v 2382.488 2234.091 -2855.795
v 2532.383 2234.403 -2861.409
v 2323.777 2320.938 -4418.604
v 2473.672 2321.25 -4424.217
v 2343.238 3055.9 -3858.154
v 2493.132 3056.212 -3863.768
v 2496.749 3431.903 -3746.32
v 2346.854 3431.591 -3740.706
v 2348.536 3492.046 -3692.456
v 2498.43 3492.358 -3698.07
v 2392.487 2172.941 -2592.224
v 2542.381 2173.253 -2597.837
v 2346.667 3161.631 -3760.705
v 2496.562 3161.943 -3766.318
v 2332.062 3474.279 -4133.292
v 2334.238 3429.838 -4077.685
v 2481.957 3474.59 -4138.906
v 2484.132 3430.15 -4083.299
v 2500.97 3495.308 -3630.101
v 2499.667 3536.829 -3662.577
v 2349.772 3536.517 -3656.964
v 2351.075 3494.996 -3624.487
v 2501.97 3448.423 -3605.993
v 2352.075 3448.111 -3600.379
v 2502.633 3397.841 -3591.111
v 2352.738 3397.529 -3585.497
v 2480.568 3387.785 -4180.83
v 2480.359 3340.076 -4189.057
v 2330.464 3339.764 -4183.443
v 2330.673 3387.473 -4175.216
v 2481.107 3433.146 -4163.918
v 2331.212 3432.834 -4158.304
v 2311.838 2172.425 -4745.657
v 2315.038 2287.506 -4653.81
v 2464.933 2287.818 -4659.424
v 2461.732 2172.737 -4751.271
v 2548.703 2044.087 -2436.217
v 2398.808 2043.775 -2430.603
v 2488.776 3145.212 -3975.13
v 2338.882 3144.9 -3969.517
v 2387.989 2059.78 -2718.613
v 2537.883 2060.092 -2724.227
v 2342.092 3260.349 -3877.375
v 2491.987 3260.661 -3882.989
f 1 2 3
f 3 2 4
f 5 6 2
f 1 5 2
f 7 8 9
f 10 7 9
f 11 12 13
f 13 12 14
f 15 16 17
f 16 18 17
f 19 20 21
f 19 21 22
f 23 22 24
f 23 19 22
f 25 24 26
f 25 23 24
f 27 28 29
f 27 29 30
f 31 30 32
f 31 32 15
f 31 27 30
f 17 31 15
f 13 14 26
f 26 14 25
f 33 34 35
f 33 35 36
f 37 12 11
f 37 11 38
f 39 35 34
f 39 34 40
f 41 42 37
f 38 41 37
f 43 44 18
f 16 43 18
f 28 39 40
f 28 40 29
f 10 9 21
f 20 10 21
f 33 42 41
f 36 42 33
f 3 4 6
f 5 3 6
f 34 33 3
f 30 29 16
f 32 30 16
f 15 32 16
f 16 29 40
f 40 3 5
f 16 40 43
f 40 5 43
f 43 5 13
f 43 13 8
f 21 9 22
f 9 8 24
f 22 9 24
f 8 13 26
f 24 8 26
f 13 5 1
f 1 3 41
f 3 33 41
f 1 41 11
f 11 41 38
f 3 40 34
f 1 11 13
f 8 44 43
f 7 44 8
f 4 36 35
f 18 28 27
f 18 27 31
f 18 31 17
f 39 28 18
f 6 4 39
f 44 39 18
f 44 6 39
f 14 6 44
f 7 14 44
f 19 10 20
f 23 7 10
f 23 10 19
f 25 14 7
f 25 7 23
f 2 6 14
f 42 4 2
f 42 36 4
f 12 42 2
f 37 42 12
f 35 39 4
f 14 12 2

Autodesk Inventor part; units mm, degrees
sketch "Sketch1" plane through (0, 0, 0) normal (0, 0, 1) x (1, 0, 0)
  arc A0 (4796.3585, -1909.6289) -> (3343.4744, 1121.5056) centre (-3903.1767, -4215.7265) ccw
  line L0 (3236.8192, 1046.7661) -> (3343.5051, 1121.464)
  arc A1 (3228.7635, 1285.3391) -> (1546.1726, 3076.3751) centre (-4110.5601, -3923.7232) ccw
  line L1 (3228.7635, 1285.3391) -> (3122.0787, 1210.6419)
  line L2 (1372.9503, 3176.3452) -> (1308.1705, 3064.1503)
  arc A2 (1372.9503, 3176.3452) -> (93.8576, 4024.2684) centre (-4221.2651, -3873.8147) ccw
  line L3 (1481.3729, 2964.1457) -> (1546.1726, 3076.3751)
  arc A3 (4543.4821, -2147.4888) -> (93.8528, 3844.2289) centre (-4256.4671, -4034.5221) ccw
  line L4 (93.8576, 4024.2684) -> (93.8528, 3844.2289)
  line L5 (1308.1705, 3064.1503) -> (1481.3729, 2964.1457)
  line L6 (3122.0787, 1210.6419) -> (3236.8192, 1046.7661)
  arc A4 (4543.4821, -2147.4888) -> (4796.3585, -1909.6289) centre (4134.8595, -1459.7188) ccw
  point P0 (0, 0)
  dimension "d7" = 800
ref_plane "Work Plane2" through (0, 0, -8101) normal (0, 0, 1) x (1, 0, 0)
ref_plane "Work Plane1" through (0, 0, 0) normal (0, 0, 1) x (1, 0, 0)
sketch "Sketch2" plane through (0, 0, -8101) normal (0, 0, 1) x (1, 0, 0)
  arc A0 (1192.0552, 3508.338) -> (93.8528, 4294.485) centre (-5164.5547, -4211.3454) ccw projected
  arc A1 (3133.8513, 1483.0798) -> (1365.2603, 3408.338) centre (-5051.6105, -4261.3276) ccw projected
  arc A2 (4543.6426, -2147.8414) -> (93.8528, 4114.0508) centre (-5207.4444, -4365.1147) ccw projected
  line L0 (1192.0552, 3508.338) -> (1126.9741, 3395.6142) projected
  line L1 (1365.2603, 3408.338) -> (1300.1792, 3295.6142) projected
  line L2 (1126.9741, 3395.6142) -> (1300.1792, 3295.6142) projected
  line L3 (93.8528, 4294.485) -> (93.8528, 4114.0508) projected
  line L4 (3027.6129, 1408.6909) -> (3133.8513, 1483.0798) projected
  line L5 (3142.3282, 1244.8605) -> (3248.5665, 1319.2494) projected
  line L6 (3027.6129, 1408.6909) -> (3142.3282, 1244.8605) projected
  arc A3 (4803.6655, -1899.2732) -> (3248.5665, 1319.2494) centre (-4832.968, -4570.4704) ccw projected
  arc A4 (4543.6426, -2147.8414) -> (4803.6655, -1899.2732) centre (4135.0016, -1460.0824) ccw projected
  point P0 (0, 0)
loft "Loft1" add profiles "Sketch1", "Sketch2"
ref_plane "Work Plane3" through (2600, 0, 0) normal (1, 0, 0) x (0, 1, 0)
sketch "Sketch3" plane through (2600, 0, 0) normal (1, 0, 0) x (0, 1, 0)
  line L0 (3120.8038, -3828.6818) -> (2179.9067, -2717.5683)
  line L1 (2179.9067, -2717.5683) -> (2281.1646, -4539.693)
  line L2 (2281.1646, -4539.693) -> (3120.8038, -3828.6818)
  line L3 (4534.6211, 332.5956) -> (-2270.5383, 332.5956)
  line L4 (-2270.5383, 332.5956) -> (-2270.5383, -8394.1003)
  line L5 (-2270.5383, -8394.1003) -> (4534.6211, -8394.1003)
  line L6 (4534.6211, -8394.1003) -> (4534.6211, 332.5956)
  point P0 (0, 0)
extrude "Extrusion1" cut sketch "Sketch3" along normal through all both and the other way through all
sketch "Sketch5" plane through (2219.0112, 2281.1646, -4539.693) normal (0, -0.9984595, -0.0554857) x (1, 0, 0)
  line L0 (318.8718, 1824.936) -> (250.4195, 0)
  point P0 (-2219.0112, 4659.2715)
ref_plane "Work Plane4" through (2537.8831, 2179.9067, -2717.5683) normal (-0.6423359, -0.7662012, -0.0184479) x (-0.0374831, 0.0554467, -0.9977578)
sketch "Sketch6" plane through (2537.8831, 2179.9067, -2717.5683) normal (-0.6423359, -0.7662012, -0.0184479) x (-0.0374831, 0.0554467, -0.9977578)
  line L0 (-729.0595, -1938.3665) -> (2085.591, -1938.3665)
  line L1 (2085.591, -1938.3665) -> (2085.591, 179.9667)
  line L2 (2085.591, 179.9667) -> (-729.0595, 179.9667)
  line L3 (-729.0595, 179.9667) -> (-729.0595, -1938.3665)
  point P0 (-2737.216, -722.0143)
extrude "Extrusion2" cut sketch "Sketch6" against normal through all
ref_plane "Work Plane5" through (2537.8831, 2179.9067, -2717.5683) normal (-0.9992973, -0.0020798, 0.0374254) x (-0.0374831, 0.0554467, -0.9977578)
sketch "Sketch7" plane through (2537.8831, 2179.9067, -2717.5683) normal (-0.9992973, -0.0020798, 0.0374254) x (-0.0374831, 0.0554467, -0.9977578)
  line L0 (1826.2193, 0) -> (0, 0) projected
  line L1 (1201.6643, -877.7967) -> (1826.2193, 0) projected
  line L2 (0, 0) -> (1201.6643, -877.7967) projected
  point P0 (-2737.216, 2025.7624)
sketch "Sketch8" plane through (2537.8831, 2179.9067, -2717.5683) normal (-0.6423359, -0.7662012, -0.0184479) x (-0.0374831, 0.0554467, -0.9977578)
  line L0 (1826.2193, 0) -> (0, 0) projected
  line L1 (1201.6643, -1365.6093) -> (1826.2193, 0) projected
  line L2 (0, 0) -> (1201.6643, -1365.6093) projected
  point P0 (-2737.216, -722.0143)
loft "Loft2" add profiles "Sketch7" section 1 edges at (2503.6569, 2230.5357, -3628.6306) (1958.4447, 2700.9842, -4184.1874) (1992.6709, 2650.3553, -3273.125)
sketch "Sketch9" plane through (2537.8831, 2179.9067, -2717.5683) normal (0.9992973, 0.0020798, -0.0374254) x (-0.0374831, 0.0554467, -0.9977578)
  line L0 (1201.6643, 877.7967) -> (0, 0) projected
  line L1 (1826.2193, 0) -> (0, 0) projected
  line L2 (1826.2193, 0) -> (1201.6643, 877.7967) projected
  point P0 (-2737.216, -2025.7624)
ref_plane "Work Plane6" through (2469.4307, 2281.1646, -4539.693) normal (0.9992973, 0.0020798, -0.0374254) x (0.0217303, 0.7814048, 0.623646)
sketch "Sketch10" plane through (2469.4307, 2281.1646, -4539.693) normal (0.9992973, 0.0020798, -0.0374254) x (0.0217303, 0.7814048, 0.623646)
  line L0 (1578.0672, -786.8916) -> (-983.5577, -786.8916)
  line L1 (-983.5577, -786.8916) -> (-983.5577, 1970.9014)
  line L2 (-983.5577, 1970.9014) -> (1578.0672, 1970.9014)
  line L3 (1578.0672, 1970.9014) -> (1578.0672, -786.8916)
  point P0 (994.987, 4892.7146)
extrude "Extrusion3" cut sketch "Sketch10" against normal through all
sketch "Sketch11" plane through (2469.4307, 2281.1646, -4539.693) normal (0.9992973, 0.0020798, -0.0374254) x (0.0217303, 0.7814048, 0.623646)
  line L0 (1027.6784, 44.8475) -> (1011.4833, 1341.5246)
  line L1 (1011.4833, 1341.5246) -> (103.4312, 65.2798)
  line L2 (103.4312, 65.2798) -> (1027.6784, 44.8475)
  line L3 (960.9484, 1557.5799) -> (-216.8429, -97.7765)
  line L4 (960.9484, 1557.5799) -> (1128.2932, 1792.779)
  line L5 (1128.2932, 1585.7882) -> (1128.2932, 1792.779)
  line L6 (-69.5683, -97.7765) -> (-216.8429, -97.7765)
  line L7 (1027.6784, -97.7765) -> (1046.3487, -386.6685)
  line L8 (1182.7704, -360.1846) -> (1182.7704, -431.4012)
  arc A0 (1046.3487, -386.6685) -> (1182.7704, -431.4012) centre (1192.5364, -171.2284) ccw
  line L9 (1394.5704, -97.7765) -> (1471.9375, -97.7765)
  line L10 (1171.1456, 55.0636) -> (1464.8769, 44.8475)
  line L11 (1471.9375, -97.7765) -> (1528.8489, -97.7765)
  arc A1 (1528.8489, -97.7765) -> (1464.8769, 44.8475) centre (1251.9333, -136.3242) ccw
  line L12 (1128.2932, 1585.7882) -> (1171.1456, 55.0636)
  line L13 (1175.4243, -97.7765) -> (1182.7704, -360.1846)
  line L14 (-69.5683, -97.7765) -> (1027.6784, -97.7765)
  line L15 (1175.4243, -97.7765) -> (1394.5704, -97.7765)
  point P0 (994.987, 4892.7146)
  point P1 (1077.3097, 0)
  point P2 (1058.7249, 1488.0116)
  point P3 (0, 0)
extrude "Extrusion4" add sketch "Sketch11" against normal blind 150
properties part number "panel_block_03" material "Wood (Maple)"
